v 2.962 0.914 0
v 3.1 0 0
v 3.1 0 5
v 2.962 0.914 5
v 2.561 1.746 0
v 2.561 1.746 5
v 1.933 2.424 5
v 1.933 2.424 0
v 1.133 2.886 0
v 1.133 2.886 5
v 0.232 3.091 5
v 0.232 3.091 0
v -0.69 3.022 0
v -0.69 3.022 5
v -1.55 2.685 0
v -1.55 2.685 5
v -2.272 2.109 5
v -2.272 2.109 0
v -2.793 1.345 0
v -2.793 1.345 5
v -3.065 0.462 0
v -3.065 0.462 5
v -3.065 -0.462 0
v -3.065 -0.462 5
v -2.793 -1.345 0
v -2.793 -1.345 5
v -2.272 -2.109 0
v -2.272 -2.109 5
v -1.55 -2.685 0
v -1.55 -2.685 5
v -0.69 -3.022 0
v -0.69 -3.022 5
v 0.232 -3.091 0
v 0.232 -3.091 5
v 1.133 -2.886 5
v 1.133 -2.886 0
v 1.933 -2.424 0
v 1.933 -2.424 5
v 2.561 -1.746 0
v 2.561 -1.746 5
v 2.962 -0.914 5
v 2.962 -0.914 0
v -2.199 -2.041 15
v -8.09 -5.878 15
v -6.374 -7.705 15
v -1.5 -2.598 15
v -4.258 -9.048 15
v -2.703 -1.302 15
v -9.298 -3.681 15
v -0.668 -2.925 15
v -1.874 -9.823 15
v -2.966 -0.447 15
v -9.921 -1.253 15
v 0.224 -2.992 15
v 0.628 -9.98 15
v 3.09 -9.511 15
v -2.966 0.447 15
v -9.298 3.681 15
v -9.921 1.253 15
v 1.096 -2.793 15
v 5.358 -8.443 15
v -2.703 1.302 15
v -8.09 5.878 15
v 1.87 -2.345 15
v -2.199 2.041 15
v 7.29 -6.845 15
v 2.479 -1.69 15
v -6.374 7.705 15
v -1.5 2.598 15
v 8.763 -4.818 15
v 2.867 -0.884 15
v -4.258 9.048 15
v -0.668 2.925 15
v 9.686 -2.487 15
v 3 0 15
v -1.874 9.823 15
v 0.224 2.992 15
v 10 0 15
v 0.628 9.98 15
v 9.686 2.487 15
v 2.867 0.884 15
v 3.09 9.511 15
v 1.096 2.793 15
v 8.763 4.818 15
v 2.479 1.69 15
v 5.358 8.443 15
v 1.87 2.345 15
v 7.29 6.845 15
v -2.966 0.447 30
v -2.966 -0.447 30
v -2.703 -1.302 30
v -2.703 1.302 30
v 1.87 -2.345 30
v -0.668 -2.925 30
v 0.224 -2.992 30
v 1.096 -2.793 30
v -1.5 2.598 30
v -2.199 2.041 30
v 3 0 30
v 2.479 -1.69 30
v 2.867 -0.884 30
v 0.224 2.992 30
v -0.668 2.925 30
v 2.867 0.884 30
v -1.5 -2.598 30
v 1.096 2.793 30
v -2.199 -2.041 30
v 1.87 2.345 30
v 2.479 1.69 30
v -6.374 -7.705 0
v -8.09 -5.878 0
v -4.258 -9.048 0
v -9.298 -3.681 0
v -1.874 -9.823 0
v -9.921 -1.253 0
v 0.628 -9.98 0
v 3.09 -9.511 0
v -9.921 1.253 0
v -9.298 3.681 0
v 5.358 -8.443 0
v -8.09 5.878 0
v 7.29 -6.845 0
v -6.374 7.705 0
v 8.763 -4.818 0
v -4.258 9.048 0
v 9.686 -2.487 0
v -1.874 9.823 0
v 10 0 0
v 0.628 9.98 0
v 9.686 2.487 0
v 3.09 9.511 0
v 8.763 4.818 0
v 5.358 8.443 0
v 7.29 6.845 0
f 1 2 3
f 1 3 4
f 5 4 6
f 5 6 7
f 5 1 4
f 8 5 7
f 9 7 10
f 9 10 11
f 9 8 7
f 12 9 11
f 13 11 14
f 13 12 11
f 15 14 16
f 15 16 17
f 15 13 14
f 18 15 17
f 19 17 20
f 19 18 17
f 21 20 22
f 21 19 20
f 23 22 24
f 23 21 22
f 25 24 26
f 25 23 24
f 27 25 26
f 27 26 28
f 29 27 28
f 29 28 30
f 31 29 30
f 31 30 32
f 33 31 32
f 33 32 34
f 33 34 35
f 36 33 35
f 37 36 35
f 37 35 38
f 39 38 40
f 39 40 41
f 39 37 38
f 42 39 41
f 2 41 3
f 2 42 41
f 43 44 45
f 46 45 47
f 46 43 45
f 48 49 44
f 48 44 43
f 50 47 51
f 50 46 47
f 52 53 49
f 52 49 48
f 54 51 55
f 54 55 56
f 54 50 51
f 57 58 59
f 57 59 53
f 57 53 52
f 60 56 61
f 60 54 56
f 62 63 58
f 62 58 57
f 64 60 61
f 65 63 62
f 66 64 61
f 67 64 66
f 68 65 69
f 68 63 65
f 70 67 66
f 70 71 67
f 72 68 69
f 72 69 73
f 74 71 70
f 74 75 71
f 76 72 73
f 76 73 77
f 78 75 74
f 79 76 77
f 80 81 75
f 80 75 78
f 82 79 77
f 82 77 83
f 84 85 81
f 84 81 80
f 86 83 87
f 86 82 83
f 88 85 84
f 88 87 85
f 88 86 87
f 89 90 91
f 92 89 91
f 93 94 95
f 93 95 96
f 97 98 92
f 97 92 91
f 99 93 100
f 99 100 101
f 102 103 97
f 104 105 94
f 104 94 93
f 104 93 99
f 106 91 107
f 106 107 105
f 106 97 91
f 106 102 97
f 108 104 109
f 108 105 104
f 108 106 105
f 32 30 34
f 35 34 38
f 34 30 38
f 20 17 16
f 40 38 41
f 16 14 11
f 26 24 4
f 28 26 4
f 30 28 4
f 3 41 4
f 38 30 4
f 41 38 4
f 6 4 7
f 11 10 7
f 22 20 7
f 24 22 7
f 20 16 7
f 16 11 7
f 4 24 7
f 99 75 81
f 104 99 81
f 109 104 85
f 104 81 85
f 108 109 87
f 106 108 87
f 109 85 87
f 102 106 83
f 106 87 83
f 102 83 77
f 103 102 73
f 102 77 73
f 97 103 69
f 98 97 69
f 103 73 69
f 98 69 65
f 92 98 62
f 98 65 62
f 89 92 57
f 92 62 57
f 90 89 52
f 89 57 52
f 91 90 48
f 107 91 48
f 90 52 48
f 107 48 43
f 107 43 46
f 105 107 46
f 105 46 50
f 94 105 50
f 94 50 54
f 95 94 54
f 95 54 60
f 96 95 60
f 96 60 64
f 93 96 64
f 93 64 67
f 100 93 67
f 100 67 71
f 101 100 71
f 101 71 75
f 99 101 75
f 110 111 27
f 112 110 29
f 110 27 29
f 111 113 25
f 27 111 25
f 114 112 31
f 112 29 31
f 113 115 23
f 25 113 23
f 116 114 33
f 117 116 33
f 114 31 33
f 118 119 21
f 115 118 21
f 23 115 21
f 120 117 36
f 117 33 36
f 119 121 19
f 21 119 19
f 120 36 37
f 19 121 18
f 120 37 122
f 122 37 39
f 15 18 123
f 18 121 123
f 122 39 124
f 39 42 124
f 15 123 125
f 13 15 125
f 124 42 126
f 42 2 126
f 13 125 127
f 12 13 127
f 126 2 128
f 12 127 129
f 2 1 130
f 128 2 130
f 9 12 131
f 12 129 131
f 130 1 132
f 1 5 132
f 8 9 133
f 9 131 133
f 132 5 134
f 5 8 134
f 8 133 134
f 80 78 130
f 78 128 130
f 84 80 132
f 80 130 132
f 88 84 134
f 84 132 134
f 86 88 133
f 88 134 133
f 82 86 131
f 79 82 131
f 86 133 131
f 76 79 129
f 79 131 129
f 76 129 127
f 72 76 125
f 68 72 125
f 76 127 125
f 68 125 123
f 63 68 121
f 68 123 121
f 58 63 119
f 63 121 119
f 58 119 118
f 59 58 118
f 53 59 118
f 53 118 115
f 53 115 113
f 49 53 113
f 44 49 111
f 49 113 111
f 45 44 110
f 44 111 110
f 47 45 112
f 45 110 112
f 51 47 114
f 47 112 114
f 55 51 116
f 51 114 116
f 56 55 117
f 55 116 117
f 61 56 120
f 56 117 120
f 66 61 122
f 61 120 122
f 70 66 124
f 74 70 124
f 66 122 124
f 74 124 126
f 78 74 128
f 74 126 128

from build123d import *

# Parameters (mm, degrees)
F0_R     = 10
F0_R_2   = 3.1
F1_DEPTH = 5
F2_R     = 10
F2_R_2   = 3.1
F2_R_3   = 3
F3_DEPTH = 10
F4_DEPTH = 25


with BuildPart() as f1:
    # F0 (on Top) → F1 (new body)
    with BuildSketch(Plane.XY):
        Circle(F0_R)
        Circle(F0_R_2, mode=Mode.SUBTRACT)
    extrude(amount=F1_DEPTH)

    # F2 (on face) → F3 (join)
    with BuildSketch(Plane.XY.offset(5)):
        Circle(F2_R)
        Circle(F2_R_2, mode=Mode.SUBTRACT)
        Circle(F2_R_2)
        Circle(F2_R_3, mode=Mode.SUBTRACT)
    extrude(amount=F3_DEPTH)

    # F2 (on face) → F4 (join)
    with BuildSketch(Plane.XY.offset(5)):
        Circle(F2_R_3)
    extrude(amount=F4_DEPTH)


solid = f1.part
